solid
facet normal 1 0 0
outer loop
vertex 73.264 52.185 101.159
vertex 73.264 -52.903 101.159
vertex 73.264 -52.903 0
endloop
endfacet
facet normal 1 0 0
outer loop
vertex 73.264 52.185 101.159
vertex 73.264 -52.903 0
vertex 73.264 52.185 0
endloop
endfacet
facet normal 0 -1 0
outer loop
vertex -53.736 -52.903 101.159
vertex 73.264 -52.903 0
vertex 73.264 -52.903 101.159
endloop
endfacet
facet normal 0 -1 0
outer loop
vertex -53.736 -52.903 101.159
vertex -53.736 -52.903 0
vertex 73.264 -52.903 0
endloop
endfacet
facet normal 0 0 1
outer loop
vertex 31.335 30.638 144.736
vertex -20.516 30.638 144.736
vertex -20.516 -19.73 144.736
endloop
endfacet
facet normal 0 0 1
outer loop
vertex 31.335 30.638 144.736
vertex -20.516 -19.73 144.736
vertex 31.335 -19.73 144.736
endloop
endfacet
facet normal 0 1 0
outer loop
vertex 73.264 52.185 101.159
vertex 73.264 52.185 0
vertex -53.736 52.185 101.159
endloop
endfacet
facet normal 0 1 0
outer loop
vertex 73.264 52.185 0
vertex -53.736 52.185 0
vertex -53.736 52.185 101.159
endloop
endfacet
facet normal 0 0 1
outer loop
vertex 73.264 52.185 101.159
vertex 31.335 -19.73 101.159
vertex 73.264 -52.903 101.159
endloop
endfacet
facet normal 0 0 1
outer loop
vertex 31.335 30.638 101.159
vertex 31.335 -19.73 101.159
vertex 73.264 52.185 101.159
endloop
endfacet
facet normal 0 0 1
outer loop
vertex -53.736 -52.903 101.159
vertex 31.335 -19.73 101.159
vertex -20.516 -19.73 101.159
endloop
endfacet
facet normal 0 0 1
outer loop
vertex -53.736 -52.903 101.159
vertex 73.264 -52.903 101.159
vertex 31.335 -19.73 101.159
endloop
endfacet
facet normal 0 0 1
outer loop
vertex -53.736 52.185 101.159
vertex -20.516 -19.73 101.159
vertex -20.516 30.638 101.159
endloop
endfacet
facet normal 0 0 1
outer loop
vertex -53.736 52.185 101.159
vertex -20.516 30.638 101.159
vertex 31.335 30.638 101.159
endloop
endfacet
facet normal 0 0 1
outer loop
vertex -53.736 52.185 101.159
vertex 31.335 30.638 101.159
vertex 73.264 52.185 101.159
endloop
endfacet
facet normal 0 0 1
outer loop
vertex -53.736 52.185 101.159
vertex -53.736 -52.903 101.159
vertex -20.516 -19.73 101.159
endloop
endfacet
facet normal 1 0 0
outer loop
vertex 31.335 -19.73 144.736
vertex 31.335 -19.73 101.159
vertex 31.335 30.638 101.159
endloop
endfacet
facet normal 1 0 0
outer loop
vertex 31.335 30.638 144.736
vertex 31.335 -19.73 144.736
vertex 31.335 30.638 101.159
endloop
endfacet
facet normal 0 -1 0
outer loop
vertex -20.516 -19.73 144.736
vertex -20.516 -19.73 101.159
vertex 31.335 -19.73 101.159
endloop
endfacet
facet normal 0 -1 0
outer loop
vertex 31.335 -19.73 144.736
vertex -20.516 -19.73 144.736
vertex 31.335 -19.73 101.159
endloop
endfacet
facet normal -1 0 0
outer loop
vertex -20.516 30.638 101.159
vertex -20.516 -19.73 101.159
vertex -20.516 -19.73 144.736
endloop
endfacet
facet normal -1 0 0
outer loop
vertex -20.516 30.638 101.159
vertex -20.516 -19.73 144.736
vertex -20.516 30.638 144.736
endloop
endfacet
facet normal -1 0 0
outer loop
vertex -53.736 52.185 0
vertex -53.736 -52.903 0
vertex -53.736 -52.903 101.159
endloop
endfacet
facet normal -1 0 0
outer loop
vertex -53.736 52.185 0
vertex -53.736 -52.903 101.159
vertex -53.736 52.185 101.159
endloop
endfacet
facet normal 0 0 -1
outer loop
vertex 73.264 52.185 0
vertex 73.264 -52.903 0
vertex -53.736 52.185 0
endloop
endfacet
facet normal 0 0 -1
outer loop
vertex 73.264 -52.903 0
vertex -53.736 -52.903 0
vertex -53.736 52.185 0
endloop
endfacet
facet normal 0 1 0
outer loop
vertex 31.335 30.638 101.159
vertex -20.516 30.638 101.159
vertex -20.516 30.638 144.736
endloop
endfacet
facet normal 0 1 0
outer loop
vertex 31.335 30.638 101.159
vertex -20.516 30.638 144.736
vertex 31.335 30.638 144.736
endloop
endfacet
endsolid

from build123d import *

# Parameters (mm, degrees)
F0_W     = 101.6
F0_H     = 105.0883368849
F1_DEPTH = 101.1590287089
F2_W     = 105.0883368849
F2_H     = 101.1590287089
F3_DEPTH = 25.4
F6_W     = 51.8510639668
F6_H     = 50.3680855036
F7_DEPTH = 43.5765609145


# Not quite as in the source:
# - the program builds the solid bodies; features that only make, move or delete a surface that nothing else refers to are left out


with BuildPart() as f1:
    # F0 (on Top) → F1 (new body)
    with BuildSketch(Plane.XY):
        with Locations((-2.9358975589, -0.3588087857)):
            Rectangle(F0_W, F0_H)
    extrude(amount=F1_DEPTH)

    # F2 (on face) → F3 (join)
    with BuildSketch(Plane.YZ.offset(47.8641024411)):
        with Locations((-0.3588087857, 50.5795143545)):
            Rectangle(F2_W, F2_H)
    extrude(amount=F3_DEPTH)

    # F6 (on face) → F7 (join)
    with BuildSketch(Plane.XY.offset(101.1590287089)):
        with Locations((5.4090619087, 5.453877151)):
            Rectangle(F6_W, F6_H)
    extrude(amount=F7_DEPTH)


solid = f1.part
